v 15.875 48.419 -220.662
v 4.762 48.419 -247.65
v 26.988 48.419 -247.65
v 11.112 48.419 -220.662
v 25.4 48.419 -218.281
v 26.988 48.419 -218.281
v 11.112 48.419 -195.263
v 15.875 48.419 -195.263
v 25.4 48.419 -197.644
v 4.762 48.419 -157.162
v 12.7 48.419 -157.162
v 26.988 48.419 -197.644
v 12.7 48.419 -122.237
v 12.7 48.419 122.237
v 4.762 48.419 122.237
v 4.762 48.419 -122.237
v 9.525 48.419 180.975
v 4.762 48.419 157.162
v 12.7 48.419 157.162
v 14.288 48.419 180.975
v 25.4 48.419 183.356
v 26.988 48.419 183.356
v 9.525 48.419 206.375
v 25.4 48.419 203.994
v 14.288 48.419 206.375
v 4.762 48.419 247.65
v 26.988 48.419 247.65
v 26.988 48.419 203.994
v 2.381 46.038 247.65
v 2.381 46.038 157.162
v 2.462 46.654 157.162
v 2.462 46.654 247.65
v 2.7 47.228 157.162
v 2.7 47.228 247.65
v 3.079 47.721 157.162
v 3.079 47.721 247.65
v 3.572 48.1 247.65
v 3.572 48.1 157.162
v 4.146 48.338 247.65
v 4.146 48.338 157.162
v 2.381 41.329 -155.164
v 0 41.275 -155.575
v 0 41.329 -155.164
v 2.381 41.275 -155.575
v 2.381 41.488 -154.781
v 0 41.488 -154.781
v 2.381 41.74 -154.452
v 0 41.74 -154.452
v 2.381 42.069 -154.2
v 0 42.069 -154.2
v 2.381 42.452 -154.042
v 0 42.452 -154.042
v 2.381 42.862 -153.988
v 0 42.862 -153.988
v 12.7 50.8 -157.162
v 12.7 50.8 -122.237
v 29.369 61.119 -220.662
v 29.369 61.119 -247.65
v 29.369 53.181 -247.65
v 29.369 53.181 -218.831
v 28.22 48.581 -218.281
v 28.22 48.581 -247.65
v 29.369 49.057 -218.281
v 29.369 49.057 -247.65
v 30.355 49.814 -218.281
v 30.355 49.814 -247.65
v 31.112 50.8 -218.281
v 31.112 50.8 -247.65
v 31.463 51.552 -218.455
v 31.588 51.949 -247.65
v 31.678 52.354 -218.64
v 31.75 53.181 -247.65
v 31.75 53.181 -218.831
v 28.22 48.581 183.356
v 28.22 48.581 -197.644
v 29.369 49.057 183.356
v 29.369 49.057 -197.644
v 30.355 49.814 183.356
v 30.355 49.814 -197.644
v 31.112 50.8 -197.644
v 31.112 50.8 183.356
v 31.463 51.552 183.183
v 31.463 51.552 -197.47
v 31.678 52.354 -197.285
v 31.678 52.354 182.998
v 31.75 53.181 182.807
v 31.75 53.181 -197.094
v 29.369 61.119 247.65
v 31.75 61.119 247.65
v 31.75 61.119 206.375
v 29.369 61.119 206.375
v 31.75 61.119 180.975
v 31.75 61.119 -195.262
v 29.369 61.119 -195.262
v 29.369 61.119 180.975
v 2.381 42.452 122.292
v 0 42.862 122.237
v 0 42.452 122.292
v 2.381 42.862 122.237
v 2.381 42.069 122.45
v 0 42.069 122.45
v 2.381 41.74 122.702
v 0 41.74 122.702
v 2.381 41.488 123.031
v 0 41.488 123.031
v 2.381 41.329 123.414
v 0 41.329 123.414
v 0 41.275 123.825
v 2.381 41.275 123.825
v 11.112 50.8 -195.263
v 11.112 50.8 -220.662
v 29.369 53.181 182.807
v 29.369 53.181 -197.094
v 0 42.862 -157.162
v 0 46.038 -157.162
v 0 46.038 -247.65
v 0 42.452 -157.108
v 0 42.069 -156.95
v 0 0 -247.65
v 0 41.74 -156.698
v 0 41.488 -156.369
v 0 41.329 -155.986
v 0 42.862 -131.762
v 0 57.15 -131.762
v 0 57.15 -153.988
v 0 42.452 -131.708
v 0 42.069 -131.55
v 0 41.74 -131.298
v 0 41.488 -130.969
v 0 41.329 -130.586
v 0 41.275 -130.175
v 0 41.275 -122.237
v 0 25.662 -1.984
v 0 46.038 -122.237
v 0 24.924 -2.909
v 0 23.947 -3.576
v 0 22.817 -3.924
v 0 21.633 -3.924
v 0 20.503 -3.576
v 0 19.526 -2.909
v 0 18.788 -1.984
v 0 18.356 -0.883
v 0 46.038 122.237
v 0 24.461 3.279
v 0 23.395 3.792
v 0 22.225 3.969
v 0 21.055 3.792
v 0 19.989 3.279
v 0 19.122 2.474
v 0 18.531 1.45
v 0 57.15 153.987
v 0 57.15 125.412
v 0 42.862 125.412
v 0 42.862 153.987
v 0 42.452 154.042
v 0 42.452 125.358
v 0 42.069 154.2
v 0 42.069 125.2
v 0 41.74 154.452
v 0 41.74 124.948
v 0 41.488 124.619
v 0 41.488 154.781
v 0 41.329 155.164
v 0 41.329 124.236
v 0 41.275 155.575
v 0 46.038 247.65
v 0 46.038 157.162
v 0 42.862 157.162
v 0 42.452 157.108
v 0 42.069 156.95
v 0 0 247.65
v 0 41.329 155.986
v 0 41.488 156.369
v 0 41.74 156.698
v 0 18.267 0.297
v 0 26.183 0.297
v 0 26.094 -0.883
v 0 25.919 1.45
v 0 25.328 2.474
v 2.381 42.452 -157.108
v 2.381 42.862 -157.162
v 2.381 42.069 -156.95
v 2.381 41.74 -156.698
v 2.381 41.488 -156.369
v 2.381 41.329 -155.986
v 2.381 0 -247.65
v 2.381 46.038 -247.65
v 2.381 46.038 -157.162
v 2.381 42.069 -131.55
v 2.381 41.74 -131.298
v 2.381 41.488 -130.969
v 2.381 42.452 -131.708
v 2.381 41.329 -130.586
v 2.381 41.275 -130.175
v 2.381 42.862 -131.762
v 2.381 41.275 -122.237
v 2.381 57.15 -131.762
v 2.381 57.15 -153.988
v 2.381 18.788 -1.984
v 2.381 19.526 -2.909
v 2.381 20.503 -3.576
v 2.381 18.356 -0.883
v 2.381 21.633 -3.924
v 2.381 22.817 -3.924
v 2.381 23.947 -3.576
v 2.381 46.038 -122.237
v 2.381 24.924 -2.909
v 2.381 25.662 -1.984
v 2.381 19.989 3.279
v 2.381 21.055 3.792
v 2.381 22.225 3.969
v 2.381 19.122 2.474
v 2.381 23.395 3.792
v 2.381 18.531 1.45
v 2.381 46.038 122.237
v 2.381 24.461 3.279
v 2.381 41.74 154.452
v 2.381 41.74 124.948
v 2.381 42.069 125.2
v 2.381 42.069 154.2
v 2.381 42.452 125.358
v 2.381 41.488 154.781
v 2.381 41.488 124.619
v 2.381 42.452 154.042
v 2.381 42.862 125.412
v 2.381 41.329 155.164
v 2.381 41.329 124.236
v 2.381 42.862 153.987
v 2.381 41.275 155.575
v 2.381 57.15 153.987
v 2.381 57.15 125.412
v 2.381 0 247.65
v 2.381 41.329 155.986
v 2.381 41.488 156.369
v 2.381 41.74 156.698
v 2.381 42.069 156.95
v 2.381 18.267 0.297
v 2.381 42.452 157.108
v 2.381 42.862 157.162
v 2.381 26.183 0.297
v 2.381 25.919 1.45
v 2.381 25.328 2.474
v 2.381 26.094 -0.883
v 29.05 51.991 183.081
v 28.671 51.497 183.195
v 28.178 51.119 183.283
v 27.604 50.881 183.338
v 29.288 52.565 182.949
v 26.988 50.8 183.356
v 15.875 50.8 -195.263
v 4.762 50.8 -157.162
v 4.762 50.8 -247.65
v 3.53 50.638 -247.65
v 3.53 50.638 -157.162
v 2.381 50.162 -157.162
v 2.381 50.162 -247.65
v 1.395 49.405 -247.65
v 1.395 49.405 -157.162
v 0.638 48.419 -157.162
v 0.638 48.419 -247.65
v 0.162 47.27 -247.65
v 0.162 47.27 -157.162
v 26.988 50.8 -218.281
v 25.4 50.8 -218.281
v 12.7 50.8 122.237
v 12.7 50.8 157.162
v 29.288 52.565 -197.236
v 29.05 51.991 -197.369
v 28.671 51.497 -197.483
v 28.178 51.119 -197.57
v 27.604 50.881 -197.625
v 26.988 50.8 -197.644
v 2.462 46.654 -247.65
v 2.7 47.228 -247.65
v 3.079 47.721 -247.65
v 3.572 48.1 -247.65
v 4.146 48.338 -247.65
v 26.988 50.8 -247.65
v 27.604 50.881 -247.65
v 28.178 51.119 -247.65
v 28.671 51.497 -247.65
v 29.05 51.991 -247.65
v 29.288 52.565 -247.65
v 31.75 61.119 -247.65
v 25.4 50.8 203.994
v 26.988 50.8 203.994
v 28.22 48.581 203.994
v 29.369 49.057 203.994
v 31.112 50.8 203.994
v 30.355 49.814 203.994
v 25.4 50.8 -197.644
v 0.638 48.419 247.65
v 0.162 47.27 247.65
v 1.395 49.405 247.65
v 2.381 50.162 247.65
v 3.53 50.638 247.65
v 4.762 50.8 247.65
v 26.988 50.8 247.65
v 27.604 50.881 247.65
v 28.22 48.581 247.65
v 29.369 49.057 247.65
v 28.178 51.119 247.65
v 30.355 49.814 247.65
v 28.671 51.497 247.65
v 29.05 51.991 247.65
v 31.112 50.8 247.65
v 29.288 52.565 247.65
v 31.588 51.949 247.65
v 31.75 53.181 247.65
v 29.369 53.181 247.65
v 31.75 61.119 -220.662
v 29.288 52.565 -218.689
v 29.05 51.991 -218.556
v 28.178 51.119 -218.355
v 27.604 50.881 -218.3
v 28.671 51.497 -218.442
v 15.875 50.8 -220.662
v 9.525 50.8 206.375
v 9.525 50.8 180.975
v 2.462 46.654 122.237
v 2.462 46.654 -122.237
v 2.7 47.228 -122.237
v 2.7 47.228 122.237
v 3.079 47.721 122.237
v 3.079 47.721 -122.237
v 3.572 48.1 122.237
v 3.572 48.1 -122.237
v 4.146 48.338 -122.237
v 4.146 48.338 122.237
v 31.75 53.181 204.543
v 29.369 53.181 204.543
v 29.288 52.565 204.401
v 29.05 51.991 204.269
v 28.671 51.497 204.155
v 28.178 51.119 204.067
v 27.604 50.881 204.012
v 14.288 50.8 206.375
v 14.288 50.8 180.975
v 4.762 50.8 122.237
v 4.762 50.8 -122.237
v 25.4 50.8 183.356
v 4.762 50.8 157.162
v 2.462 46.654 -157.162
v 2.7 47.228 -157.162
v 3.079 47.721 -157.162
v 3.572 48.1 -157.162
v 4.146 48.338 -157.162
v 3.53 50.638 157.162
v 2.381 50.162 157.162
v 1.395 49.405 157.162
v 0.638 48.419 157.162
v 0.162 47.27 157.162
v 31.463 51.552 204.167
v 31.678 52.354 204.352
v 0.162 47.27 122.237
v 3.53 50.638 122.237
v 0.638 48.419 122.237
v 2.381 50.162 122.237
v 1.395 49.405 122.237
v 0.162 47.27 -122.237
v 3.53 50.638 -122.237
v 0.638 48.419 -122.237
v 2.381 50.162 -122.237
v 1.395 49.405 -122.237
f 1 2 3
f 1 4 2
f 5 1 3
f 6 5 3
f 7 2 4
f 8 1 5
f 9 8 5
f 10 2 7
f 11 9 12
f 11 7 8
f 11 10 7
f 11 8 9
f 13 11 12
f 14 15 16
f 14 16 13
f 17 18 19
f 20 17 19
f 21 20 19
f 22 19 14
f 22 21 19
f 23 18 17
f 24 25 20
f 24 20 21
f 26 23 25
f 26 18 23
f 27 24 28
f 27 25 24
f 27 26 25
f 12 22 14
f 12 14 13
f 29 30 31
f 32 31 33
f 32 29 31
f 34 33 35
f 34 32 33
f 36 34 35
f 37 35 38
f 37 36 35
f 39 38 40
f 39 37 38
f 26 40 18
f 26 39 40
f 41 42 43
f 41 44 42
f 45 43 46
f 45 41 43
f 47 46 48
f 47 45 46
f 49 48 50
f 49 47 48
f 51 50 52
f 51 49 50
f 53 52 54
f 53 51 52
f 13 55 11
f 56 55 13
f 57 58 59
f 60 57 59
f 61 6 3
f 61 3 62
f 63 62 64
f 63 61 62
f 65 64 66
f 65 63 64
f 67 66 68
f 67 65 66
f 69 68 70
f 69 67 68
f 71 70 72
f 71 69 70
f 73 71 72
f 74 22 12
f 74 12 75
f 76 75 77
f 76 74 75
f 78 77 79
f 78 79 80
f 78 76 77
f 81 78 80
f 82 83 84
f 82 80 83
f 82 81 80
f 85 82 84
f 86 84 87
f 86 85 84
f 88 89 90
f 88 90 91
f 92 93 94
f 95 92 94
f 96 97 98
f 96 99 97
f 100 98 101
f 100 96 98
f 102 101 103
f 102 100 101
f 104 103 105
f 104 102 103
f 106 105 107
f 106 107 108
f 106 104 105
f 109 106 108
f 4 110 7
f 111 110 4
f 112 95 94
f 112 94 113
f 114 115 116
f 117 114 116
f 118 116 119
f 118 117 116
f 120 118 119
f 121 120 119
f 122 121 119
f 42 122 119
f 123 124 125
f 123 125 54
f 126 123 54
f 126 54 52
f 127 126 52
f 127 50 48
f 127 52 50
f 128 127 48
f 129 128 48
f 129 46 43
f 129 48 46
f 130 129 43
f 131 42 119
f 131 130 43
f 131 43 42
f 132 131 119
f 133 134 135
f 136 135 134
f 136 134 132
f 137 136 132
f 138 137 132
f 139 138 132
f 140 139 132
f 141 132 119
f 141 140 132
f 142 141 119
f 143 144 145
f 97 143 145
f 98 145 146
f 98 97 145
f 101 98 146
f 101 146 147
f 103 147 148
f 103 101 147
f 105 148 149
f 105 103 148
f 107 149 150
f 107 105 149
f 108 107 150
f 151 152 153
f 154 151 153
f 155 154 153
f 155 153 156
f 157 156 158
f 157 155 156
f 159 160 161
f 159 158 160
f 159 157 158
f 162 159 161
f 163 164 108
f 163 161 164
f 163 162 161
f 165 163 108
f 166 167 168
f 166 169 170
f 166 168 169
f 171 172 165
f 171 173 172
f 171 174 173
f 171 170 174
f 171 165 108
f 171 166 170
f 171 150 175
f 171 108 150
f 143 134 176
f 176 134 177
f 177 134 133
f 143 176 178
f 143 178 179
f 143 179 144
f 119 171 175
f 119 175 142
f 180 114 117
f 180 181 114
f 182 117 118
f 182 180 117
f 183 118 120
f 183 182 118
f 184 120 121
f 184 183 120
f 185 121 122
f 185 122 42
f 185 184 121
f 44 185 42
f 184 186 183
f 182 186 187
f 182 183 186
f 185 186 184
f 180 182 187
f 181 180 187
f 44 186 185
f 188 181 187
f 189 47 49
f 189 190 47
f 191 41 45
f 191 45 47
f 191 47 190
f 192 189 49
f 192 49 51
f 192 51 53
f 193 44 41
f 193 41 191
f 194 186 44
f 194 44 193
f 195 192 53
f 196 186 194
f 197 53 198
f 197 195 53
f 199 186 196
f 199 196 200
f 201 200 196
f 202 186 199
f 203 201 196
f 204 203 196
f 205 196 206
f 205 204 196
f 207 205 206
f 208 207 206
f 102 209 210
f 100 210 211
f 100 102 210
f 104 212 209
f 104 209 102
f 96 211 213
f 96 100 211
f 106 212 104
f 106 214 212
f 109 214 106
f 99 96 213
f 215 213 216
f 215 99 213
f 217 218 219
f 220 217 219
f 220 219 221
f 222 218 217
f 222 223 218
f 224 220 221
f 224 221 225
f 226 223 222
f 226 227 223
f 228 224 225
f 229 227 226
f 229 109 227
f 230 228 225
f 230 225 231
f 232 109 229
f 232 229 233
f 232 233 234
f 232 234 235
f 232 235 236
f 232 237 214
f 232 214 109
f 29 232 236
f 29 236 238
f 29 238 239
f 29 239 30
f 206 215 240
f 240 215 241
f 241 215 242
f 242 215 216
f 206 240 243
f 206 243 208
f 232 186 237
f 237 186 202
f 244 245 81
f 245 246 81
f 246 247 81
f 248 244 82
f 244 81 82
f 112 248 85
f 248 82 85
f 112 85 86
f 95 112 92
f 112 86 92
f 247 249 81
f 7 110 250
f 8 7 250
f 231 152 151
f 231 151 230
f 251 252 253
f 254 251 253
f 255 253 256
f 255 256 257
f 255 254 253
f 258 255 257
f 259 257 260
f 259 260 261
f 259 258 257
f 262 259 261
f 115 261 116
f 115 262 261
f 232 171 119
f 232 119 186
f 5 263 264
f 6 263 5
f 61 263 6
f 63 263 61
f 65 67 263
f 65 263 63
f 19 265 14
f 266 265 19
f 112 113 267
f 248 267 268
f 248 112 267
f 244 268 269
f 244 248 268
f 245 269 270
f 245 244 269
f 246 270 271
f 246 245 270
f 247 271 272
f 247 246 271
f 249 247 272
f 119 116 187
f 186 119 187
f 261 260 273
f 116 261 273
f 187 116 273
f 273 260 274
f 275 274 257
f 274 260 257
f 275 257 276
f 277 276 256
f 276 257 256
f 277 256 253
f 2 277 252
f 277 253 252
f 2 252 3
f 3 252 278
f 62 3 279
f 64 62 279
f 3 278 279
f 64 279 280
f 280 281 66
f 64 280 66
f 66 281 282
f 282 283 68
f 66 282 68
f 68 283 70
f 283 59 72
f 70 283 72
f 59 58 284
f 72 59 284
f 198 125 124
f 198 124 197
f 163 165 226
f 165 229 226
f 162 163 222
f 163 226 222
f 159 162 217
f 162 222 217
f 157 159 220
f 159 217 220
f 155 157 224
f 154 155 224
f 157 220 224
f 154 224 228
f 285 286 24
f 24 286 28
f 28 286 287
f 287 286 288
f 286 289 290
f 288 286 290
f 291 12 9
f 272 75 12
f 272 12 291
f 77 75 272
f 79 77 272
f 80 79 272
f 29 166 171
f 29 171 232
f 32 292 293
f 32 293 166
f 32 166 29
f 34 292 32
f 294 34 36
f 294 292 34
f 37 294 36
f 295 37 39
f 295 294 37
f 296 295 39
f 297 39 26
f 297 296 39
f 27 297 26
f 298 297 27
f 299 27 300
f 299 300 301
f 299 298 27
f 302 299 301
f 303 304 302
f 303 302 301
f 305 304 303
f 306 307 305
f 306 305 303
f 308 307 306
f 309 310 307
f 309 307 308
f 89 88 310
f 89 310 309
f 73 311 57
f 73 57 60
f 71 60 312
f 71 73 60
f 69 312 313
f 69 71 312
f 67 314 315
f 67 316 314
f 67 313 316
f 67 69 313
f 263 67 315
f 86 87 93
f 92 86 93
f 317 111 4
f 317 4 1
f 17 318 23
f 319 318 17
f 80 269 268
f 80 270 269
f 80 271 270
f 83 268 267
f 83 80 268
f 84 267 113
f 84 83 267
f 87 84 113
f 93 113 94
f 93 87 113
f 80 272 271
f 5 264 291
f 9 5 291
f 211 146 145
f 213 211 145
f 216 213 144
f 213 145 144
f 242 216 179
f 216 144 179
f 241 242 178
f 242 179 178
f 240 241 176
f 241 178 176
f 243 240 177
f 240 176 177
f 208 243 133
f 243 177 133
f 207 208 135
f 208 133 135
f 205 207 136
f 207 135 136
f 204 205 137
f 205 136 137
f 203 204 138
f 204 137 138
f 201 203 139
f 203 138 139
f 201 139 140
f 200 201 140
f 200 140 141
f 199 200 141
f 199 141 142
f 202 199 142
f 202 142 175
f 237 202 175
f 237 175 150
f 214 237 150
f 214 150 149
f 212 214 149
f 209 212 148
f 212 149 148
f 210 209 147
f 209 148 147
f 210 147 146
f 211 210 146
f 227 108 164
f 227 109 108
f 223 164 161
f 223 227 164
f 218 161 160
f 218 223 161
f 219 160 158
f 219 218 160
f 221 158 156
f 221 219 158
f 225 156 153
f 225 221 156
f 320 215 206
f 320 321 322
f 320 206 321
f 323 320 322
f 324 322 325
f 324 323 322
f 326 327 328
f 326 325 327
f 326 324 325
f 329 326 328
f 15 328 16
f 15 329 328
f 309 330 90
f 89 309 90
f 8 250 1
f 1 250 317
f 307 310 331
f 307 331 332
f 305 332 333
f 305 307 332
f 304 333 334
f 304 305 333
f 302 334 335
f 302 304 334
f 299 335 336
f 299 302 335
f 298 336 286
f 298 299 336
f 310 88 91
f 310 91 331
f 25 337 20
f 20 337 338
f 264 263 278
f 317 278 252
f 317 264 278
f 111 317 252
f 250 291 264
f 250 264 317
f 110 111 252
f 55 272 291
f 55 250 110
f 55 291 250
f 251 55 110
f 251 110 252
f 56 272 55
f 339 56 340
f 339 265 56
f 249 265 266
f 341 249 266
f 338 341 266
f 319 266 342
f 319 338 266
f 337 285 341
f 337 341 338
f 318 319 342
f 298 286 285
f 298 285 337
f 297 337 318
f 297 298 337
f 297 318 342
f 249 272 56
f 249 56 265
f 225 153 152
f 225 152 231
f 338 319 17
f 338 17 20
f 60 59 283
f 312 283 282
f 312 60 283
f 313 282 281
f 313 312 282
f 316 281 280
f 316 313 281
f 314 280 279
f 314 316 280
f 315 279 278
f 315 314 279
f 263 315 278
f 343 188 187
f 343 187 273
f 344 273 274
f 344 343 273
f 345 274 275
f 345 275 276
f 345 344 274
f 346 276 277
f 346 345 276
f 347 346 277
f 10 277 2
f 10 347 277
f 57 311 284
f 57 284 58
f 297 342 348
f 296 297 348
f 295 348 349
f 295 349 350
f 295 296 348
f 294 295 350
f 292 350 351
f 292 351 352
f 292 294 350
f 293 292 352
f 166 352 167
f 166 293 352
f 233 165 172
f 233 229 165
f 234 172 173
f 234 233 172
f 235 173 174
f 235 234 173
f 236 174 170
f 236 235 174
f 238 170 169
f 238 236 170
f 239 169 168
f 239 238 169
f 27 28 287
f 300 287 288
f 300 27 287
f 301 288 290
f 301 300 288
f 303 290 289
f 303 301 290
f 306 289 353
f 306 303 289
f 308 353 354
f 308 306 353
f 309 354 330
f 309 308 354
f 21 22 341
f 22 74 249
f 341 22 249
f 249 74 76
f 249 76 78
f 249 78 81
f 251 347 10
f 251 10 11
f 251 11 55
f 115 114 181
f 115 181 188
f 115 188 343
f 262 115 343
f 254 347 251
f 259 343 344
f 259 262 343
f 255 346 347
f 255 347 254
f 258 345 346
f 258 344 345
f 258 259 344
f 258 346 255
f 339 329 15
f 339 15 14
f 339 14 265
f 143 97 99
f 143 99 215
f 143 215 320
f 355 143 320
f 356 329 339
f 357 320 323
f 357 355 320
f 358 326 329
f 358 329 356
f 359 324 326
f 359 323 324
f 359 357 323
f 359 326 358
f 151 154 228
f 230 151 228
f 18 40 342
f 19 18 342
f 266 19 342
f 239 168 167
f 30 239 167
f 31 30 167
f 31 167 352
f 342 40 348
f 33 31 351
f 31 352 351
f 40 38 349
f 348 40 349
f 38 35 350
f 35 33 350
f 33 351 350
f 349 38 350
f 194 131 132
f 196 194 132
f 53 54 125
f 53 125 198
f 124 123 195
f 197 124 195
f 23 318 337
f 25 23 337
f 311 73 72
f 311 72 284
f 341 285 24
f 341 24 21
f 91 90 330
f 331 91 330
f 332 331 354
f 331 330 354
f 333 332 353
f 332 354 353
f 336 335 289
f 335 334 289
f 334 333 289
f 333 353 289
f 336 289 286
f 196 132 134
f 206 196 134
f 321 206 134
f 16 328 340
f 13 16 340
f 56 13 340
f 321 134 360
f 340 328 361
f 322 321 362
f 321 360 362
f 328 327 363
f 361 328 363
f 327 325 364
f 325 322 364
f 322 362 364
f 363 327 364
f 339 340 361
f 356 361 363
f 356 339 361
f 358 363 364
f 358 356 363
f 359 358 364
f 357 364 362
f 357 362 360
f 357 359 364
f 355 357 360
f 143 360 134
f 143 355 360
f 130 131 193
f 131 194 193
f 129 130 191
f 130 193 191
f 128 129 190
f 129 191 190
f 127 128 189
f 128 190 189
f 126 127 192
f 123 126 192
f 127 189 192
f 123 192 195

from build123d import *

# Parameters (mm, degrees)
EXTRUDE1_DEPTH     = 247.65
SKETCH2_W          = 34.925
SKETCH2_H          = 9.525
CUT_EXTRUDE1_DEPTH = 12.7
SKETCH3_W          = 2.38125
SKETCH3_H          = 22.225
SKETCH3_H_2        = 28.575
EXTRUDE2_DEPTH     = 15.875
FILLET1_R          = 1.5875
SKETCH4_W          = 4.7625
SKETCH4_H          = 25.4
CUT_EXTRUDE2_DEPTH = 2.38125
CUT_EXTRUDE3_DEPTH = 6.35
SKETCH6_R          = 3.96875
CUT_EXTRUDE4_DEPTH = 2.38125


with BuildPart() as part:
    # Sketch1 → Extrude1 (new, symmetric)
    with BuildSketch(Plane.XY):
        with BuildLine():
            Line((0, 46.0375), (0, 0))
            Line((0, 0), (2.38125, 0))
            Line((2.38125, 0), (2.38125, 46.0375))
            ThreePointArc((2.38125, 46.0375), (3.078701977, 47.721298023), (4.7625, 48.41875))
            Line((4.7625, 48.41875), (26.9875, 48.41875))
            ThreePointArc((26.9875, 48.41875), (30.355096045, 49.813653955), (31.75, 53.18125))
            Line((31.75, 53.18125), (31.75, 61.11875))
            Line((31.75, 61.11875), (29.36875, 61.11875))
            Line((29.36875, 61.11875), (29.36875, 53.18125))
            ThreePointArc((29.36875, 53.18125), (28.671298023, 51.497451977), (26.9875, 50.8))
            Line((26.9875, 50.8), (4.7625, 50.8))
            ThreePointArc((4.7625, 50.8), (1.394903955, 49.405096045), (0, 46.0375))
        make_face()
    extrude(amount=EXTRUDE1_DEPTH, both=True)

    # Sketch2 → Cut-Extrude1 (cut)
    with BuildSketch(Plane.ZY):
        with Locations((-139.7, 46.0375)):
            Rectangle(SKETCH2_W, SKETCH2_H)
        with Locations((139.7, 46.0375)):
            Rectangle(SKETCH2_W, SKETCH2_H)
    extrude(amount=-CUT_EXTRUDE1_DEPTH, mode=Mode.SUBTRACT)

    # Sketch3 → Extrude2 (add)
    with BuildSketch(Plane(origin=(0, 41.275, 0), x_dir=(1, 0, 0), z_dir=(0, 1, 0))):
        with Locations((1.190625, 142.875)):
            Rectangle(SKETCH3_W, SKETCH3_H)
        with Locations((1.190625, -139.7)):
            Rectangle(SKETCH3_W, SKETCH3_H_2)
    extrude(amount=EXTRUDE2_DEPTH)

    # Fillet1
    fillet1_edges = [part.edges().sort_by_distance(p)[0] for p in [
        (1.190625, 41.275, 125.4125),
        (1.190625, 41.275, 153.9875),
        (1.190625, 41.275, -157.1625),
        (1.190625, 41.275, 157.1625),
        (1.190625, 41.275, 122.2375),
        (1.190625, 41.275, -153.9875),
        (1.190625, 41.275, -131.7625),
    ]]
    fillet(fillet1_edges, radius=FILLET1_R - 0.0001)  # a hair under: the kernel refuses the full size

    # Sketch4 → Cut-Extrude2 (cut)
    with BuildSketch(Plane(origin=(0, 50.8, 0), x_dir=(1, 0, 0), z_dir=(0, 1, 0))):
        with Locations((13.49375, 207.9625)):
            Rectangle(SKETCH4_W, SKETCH4_H)
        with Locations((11.90625, -193.675)):
            Rectangle(SKETCH4_W, SKETCH4_H)
    extrude(amount=-CUT_EXTRUDE2_DEPTH, mode=Mode.SUBTRACT)

    # Sketch5 → Cut-Extrude3 (cut)
    with BuildSketch(Plane(origin=(31.75, 0, 0), x_dir=(0, 0, -1), z_dir=(1, 0, 0))):
        Polygon((195.2625, 61.11875), (220.6625, 61.11875), (218.28125, 50.8), (218.28125, 48.41875), (197.64375, 48.41875), (197.64375, 50.8), align=None)
        Polygon((-180.975, 61.11875), (-206.375, 61.11875), (-203.99375, 50.8), (-203.99375, 48.41875), (-183.35625, 48.41875), (-183.35625, 50.8), align=None)
    extrude(amount=-CUT_EXTRUDE3_DEPTH, mode=Mode.SUBTRACT)

    # Sketch6 → Cut-Extrude4 (cut)
    with BuildSketch(Plane.ZY):
        with Locations((0, 22.225)):
            Circle(SKETCH6_R)
    extrude(amount=-CUT_EXTRUDE4_DEPTH, mode=Mode.SUBTRACT)


solid = part.part
